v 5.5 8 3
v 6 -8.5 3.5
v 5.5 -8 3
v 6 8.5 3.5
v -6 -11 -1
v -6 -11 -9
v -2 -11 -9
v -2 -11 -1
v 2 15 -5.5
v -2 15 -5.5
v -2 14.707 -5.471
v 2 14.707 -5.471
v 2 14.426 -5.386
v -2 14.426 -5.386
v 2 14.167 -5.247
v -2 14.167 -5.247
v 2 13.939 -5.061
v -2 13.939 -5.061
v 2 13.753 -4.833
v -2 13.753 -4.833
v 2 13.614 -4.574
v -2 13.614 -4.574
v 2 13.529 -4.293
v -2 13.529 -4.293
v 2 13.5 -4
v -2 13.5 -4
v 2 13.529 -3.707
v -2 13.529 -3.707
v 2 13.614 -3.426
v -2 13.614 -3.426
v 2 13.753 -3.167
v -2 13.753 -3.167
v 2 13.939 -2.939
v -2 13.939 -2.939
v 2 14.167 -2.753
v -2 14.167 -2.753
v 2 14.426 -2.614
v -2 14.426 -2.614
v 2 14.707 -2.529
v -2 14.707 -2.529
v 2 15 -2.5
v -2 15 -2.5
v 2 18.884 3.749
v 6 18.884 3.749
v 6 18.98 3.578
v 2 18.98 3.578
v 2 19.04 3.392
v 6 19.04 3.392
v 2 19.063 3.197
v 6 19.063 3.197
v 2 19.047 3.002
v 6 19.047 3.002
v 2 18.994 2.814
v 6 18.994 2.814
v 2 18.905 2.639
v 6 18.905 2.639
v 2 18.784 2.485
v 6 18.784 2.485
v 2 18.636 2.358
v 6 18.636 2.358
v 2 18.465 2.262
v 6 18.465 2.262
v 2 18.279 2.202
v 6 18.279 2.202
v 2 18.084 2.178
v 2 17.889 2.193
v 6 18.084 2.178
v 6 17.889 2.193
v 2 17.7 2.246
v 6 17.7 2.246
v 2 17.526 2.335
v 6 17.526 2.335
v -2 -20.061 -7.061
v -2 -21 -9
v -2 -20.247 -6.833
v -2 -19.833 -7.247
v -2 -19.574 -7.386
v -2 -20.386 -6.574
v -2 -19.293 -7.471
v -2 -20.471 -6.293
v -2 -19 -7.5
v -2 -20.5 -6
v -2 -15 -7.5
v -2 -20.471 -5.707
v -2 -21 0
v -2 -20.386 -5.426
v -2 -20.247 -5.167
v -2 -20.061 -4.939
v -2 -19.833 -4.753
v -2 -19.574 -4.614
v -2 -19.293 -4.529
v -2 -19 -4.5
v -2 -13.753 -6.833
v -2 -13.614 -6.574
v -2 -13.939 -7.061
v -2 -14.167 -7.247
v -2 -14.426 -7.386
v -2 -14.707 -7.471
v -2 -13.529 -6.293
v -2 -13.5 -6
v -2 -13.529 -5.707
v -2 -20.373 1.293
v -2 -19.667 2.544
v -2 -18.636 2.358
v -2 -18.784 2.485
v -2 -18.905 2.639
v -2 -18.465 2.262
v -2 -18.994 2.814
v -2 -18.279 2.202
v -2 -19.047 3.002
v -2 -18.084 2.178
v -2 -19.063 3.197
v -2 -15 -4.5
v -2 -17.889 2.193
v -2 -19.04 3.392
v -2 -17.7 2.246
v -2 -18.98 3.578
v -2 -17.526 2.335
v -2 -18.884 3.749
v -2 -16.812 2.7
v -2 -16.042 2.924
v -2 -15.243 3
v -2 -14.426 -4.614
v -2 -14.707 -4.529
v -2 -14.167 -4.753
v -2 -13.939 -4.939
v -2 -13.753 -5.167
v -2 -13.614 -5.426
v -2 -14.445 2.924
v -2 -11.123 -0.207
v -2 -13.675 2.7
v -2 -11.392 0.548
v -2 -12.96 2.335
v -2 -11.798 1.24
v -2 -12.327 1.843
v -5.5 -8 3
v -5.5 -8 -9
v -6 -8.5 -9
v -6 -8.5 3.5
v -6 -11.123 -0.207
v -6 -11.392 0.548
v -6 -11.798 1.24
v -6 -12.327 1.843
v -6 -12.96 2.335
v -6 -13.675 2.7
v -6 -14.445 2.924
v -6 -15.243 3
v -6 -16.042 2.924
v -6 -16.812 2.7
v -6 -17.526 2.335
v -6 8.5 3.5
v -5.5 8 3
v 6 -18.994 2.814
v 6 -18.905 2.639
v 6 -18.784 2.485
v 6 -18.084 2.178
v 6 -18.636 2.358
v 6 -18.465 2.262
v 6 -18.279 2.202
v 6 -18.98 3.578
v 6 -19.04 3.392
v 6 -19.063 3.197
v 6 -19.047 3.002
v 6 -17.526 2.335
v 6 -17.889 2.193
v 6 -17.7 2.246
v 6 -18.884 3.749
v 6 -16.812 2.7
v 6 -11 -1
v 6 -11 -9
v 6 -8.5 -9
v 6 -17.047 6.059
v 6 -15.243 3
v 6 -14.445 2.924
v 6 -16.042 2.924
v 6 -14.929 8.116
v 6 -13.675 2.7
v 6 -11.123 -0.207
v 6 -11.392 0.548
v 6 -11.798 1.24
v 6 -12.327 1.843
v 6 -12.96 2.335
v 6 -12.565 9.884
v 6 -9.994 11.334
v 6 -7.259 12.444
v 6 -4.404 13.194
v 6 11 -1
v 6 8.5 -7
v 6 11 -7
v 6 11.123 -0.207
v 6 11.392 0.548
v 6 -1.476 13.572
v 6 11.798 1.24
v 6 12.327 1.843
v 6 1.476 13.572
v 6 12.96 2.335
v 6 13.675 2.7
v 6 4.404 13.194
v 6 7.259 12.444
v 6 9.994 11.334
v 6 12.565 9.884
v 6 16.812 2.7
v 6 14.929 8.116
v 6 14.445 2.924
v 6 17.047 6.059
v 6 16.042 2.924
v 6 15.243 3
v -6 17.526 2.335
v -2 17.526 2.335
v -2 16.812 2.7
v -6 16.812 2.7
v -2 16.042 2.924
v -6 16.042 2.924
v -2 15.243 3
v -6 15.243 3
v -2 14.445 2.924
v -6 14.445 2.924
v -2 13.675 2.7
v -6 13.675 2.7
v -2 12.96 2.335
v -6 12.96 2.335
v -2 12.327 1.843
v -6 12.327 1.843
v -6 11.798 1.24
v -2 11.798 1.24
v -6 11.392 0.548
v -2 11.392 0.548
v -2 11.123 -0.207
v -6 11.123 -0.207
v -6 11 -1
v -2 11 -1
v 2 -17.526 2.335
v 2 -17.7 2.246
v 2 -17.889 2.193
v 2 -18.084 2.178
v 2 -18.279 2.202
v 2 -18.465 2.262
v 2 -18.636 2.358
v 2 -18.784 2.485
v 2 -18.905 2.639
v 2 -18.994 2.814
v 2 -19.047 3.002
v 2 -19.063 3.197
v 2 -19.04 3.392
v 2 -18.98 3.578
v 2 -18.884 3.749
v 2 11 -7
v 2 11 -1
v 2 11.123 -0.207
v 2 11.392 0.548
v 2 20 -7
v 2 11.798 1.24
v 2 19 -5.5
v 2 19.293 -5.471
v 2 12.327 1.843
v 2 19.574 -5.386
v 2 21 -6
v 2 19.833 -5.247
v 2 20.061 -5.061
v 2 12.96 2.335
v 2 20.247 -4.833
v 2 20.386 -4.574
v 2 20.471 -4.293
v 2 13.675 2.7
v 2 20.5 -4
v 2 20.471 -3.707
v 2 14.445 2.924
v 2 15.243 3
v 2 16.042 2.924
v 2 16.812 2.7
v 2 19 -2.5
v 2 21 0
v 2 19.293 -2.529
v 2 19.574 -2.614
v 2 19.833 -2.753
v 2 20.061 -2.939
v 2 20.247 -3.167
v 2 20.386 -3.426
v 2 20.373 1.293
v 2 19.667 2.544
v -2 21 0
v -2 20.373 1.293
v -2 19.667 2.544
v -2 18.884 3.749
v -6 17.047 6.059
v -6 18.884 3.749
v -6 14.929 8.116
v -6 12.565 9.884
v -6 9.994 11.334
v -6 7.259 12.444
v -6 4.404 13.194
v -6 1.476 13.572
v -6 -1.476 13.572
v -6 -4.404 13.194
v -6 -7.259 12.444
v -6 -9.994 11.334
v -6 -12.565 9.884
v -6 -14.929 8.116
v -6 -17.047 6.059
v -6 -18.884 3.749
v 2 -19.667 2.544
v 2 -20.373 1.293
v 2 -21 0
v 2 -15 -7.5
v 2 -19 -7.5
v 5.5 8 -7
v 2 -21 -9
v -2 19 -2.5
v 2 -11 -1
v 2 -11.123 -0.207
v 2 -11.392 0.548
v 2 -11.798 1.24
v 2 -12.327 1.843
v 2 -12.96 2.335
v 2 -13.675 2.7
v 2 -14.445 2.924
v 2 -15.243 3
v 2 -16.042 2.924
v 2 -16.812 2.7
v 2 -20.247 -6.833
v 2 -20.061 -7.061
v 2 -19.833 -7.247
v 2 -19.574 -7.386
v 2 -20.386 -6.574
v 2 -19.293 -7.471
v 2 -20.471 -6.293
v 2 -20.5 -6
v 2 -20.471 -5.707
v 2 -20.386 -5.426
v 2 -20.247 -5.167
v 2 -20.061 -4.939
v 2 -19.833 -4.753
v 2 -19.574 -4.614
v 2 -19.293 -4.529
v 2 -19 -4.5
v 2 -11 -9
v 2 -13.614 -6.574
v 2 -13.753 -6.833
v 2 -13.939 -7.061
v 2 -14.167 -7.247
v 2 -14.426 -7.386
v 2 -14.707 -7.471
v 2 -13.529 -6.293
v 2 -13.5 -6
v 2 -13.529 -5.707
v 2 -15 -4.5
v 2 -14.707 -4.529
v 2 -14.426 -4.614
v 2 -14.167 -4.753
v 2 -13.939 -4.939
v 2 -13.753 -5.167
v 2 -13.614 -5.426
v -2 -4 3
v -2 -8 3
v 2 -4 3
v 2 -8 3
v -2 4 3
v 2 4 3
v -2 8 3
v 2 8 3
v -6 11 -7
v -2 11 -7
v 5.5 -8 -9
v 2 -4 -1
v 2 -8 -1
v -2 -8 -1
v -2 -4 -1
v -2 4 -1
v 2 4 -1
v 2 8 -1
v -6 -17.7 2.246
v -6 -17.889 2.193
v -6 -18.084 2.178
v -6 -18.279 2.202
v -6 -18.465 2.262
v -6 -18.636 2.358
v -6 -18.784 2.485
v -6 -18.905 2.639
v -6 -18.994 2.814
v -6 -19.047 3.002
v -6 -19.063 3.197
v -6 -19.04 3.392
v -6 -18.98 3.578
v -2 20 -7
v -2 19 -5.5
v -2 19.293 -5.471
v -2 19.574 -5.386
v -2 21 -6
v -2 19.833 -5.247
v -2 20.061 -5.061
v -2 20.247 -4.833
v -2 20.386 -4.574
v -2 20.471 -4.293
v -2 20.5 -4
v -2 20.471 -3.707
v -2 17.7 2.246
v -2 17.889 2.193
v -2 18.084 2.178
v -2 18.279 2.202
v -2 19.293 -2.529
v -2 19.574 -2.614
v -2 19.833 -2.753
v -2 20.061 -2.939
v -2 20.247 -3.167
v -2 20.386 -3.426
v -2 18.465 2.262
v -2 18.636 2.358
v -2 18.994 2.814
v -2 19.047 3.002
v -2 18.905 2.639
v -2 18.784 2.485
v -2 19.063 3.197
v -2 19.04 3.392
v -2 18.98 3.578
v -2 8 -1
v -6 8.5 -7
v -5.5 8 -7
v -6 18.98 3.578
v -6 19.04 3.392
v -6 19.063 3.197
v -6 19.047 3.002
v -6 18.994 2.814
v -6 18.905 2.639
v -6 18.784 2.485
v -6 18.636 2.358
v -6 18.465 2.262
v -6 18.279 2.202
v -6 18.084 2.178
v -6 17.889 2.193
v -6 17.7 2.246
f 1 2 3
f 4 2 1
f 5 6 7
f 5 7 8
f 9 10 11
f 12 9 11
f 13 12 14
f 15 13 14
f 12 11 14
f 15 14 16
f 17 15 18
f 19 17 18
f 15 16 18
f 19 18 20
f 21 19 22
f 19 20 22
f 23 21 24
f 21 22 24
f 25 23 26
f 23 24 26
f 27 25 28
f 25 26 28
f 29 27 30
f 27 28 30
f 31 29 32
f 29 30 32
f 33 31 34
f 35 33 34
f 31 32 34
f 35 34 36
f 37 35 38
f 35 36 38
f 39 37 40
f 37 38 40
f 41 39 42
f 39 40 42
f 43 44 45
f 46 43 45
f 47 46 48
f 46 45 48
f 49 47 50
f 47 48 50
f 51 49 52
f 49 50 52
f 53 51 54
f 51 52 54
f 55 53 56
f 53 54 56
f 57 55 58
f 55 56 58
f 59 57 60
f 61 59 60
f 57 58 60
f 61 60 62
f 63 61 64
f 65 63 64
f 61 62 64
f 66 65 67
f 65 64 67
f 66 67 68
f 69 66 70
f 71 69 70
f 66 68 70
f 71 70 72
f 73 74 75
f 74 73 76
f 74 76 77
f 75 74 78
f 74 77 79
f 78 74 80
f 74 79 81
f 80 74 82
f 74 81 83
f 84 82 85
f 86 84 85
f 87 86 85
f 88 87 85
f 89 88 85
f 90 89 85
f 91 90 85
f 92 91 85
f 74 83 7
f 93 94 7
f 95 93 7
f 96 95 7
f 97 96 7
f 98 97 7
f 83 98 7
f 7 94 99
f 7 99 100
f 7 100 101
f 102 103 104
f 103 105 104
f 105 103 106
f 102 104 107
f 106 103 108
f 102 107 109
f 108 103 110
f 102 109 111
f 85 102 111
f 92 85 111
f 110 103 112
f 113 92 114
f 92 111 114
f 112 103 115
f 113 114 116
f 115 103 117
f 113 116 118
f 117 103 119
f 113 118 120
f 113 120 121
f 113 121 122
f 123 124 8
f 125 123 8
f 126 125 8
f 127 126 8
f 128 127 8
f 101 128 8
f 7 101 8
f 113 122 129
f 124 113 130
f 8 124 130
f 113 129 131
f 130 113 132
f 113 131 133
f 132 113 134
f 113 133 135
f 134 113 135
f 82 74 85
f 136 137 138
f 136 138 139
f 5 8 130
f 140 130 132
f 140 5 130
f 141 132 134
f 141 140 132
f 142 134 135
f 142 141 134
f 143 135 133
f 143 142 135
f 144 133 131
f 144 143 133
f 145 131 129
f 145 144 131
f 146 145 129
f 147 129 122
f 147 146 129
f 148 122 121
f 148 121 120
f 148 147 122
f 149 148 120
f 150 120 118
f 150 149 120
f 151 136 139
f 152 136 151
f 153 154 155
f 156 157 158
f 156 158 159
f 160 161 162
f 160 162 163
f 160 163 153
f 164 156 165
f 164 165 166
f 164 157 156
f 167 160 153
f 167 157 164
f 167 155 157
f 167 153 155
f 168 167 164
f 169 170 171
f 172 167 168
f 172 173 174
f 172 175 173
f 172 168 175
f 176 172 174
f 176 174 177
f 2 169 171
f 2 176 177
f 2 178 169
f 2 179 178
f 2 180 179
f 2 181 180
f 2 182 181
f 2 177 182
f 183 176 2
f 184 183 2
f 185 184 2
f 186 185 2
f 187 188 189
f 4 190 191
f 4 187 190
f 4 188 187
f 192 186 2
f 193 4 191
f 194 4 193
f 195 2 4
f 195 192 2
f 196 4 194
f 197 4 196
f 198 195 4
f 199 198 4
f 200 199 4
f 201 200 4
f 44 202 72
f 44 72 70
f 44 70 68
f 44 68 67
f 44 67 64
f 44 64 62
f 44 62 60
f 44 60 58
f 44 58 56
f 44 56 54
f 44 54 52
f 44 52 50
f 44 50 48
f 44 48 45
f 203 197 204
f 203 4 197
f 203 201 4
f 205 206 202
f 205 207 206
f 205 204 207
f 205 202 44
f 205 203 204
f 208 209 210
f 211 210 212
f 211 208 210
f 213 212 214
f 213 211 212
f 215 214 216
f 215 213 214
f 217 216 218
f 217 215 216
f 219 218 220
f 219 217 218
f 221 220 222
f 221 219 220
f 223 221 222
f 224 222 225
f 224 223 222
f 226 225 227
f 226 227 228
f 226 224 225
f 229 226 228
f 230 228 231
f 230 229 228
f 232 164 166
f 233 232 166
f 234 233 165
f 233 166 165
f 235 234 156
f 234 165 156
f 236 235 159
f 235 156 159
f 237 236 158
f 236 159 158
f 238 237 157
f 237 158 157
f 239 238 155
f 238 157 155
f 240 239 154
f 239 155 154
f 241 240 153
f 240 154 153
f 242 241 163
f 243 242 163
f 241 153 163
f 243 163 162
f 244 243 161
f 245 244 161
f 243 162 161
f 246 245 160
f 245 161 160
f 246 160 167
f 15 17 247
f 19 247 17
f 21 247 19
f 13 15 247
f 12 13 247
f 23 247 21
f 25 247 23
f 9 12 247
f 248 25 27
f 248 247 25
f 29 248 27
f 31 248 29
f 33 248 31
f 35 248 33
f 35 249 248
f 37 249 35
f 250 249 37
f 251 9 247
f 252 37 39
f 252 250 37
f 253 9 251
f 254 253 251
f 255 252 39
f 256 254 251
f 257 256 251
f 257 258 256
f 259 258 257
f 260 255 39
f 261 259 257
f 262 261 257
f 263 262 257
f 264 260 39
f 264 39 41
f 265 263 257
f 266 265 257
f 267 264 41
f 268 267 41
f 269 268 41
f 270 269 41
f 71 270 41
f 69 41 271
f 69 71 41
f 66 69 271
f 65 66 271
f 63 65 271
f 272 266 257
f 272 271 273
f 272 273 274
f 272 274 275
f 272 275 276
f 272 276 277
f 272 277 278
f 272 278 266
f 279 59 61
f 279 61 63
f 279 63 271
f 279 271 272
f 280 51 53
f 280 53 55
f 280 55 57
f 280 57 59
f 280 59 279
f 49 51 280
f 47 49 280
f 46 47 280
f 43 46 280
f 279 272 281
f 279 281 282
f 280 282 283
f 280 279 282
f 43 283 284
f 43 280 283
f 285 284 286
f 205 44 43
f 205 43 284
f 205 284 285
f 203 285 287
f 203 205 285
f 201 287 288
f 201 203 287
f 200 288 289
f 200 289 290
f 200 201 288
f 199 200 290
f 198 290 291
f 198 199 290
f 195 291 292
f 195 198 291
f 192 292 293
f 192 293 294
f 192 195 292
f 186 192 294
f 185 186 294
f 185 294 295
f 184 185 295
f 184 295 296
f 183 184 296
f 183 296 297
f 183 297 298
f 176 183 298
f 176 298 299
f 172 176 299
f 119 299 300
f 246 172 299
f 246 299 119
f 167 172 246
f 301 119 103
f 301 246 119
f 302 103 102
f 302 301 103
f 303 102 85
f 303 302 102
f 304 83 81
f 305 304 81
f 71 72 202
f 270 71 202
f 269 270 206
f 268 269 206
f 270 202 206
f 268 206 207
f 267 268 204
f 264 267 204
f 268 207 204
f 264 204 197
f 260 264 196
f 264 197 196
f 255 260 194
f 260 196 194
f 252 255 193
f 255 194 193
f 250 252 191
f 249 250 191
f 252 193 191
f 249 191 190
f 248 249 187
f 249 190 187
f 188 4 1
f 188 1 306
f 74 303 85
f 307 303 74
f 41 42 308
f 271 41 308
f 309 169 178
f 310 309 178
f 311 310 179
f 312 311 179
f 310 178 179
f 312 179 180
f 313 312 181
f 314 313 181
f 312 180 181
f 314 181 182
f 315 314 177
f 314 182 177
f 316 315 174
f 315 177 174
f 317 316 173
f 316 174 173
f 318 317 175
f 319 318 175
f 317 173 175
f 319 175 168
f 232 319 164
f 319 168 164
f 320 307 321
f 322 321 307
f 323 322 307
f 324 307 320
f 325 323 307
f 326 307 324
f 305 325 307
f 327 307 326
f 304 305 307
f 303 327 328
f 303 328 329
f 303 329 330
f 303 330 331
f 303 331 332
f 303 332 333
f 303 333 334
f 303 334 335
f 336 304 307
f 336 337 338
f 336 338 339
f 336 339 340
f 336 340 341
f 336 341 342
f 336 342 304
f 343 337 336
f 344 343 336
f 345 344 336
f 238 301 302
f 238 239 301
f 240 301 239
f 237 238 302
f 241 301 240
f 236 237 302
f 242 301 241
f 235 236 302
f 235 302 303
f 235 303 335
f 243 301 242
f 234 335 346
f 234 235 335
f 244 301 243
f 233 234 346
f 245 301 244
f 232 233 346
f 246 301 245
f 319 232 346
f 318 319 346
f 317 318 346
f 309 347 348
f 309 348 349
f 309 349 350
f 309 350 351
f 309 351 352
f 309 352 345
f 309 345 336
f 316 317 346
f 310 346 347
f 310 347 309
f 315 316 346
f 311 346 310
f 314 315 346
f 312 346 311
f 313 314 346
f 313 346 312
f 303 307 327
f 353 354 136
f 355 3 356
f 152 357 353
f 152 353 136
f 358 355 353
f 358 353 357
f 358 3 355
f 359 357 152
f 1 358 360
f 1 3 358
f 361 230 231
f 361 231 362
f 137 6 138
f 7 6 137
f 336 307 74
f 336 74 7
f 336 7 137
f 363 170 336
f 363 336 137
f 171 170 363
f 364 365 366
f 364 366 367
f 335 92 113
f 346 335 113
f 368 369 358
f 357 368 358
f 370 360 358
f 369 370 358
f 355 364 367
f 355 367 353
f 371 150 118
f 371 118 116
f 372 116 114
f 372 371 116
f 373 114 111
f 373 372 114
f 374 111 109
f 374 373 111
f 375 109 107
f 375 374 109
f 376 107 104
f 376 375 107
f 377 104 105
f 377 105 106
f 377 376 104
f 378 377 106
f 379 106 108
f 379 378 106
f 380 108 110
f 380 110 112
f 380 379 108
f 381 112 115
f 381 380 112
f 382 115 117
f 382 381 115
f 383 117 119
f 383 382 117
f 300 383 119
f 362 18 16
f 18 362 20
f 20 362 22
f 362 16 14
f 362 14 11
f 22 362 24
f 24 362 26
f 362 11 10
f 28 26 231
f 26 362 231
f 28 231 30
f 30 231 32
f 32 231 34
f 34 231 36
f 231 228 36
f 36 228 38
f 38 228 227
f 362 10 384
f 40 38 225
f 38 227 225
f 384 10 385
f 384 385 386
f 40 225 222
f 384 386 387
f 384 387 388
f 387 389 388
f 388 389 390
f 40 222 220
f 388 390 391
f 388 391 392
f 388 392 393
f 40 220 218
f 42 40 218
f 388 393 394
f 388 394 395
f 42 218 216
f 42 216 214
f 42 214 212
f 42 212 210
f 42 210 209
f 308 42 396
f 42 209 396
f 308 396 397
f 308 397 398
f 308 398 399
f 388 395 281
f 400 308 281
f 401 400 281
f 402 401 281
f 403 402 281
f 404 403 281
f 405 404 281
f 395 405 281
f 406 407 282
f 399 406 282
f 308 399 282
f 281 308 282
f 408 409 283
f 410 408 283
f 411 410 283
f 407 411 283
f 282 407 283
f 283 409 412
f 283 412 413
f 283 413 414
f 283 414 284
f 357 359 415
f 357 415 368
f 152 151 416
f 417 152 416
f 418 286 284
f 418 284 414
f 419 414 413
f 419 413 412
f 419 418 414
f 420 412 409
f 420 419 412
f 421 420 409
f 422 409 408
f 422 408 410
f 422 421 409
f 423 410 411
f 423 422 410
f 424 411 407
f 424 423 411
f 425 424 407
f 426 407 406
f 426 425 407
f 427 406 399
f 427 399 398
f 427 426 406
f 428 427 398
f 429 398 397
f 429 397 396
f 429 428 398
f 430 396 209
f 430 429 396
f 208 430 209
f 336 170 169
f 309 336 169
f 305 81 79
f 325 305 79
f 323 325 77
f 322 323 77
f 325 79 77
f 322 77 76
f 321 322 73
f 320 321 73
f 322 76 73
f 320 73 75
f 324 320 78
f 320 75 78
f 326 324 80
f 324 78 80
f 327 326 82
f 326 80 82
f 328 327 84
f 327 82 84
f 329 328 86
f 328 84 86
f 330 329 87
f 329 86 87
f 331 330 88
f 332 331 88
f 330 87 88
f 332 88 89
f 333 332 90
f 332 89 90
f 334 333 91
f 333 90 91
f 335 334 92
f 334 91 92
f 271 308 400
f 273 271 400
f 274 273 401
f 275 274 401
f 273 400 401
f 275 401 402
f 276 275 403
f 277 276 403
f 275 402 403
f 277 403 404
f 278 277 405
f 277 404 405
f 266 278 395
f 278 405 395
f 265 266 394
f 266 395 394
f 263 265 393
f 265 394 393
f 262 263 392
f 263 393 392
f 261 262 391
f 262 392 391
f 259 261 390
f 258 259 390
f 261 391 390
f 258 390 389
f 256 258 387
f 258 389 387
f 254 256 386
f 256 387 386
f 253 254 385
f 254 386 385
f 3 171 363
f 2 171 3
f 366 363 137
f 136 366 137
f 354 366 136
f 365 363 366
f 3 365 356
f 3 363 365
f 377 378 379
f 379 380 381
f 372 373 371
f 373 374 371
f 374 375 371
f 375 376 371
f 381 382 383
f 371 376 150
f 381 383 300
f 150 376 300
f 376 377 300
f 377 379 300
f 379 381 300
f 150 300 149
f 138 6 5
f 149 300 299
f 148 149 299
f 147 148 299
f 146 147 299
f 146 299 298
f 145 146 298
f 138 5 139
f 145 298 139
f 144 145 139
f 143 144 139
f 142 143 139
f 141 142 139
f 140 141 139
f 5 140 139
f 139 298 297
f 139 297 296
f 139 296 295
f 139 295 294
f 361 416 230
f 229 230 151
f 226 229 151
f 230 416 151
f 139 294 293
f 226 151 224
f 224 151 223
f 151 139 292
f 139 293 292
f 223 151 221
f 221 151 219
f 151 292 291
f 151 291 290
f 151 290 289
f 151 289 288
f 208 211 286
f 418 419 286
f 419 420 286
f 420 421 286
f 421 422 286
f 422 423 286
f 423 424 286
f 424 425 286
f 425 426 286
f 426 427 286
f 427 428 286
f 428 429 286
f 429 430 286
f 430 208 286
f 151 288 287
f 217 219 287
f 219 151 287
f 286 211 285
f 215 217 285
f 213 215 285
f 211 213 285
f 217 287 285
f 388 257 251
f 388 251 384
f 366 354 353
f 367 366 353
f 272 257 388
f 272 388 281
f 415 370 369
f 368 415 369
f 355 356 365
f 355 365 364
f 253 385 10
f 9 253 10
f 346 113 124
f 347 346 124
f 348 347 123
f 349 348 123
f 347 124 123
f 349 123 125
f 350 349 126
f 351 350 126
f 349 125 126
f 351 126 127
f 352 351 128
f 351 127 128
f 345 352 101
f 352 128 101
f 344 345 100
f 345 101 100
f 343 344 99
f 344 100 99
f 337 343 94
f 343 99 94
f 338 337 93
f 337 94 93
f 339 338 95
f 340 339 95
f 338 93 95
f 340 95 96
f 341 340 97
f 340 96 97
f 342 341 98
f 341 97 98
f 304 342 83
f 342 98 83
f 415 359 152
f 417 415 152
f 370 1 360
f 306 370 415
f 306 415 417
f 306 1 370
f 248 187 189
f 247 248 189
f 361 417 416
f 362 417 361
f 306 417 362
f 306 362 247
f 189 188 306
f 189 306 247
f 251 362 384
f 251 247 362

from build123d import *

# Parameters (mm, degrees)
BOSS_EXTRUDE1_DEPTH     = 6
CHAMFER1_SIZE           = 0.5
CHAMFER2_SIZE           = 0.5
SKETCH3_W               = 4
SKETCH3_H               = 4
BOSS_EXTRUDE2_DEPTH     = 2
CUT_EXTRUDE1_START      = 28.757553028
CUT_EXTRUDE1_DEPTH      = 32.757553028
CHAMFER3_SIZE           = 1
CUT_EXTRUDE2_DEPTH      = 27.277019429
CUT_EXTRUDE2_DEPTH_BACK = 27.277019429
CUT_EXTRUDE3_DEPTH      = 27.277019429
CUT_EXTRUDE3_DEPTH_BACK = 27.277019429


with BuildPart() as part:
    # Sketch1 → Boss-Extrude1 (new, symmetric)
    with BuildSketch(Plane.YZ):
        with BuildLine():
            Line((-21, 0), (-21, -9))
            Line((-21, -9), (-8, -9))
            Line((-8, -9), (-8, 3))
            Line((-8, 3), (8, 3))
            Line((8, 3), (8, -7))
            Line((8, -7), (21, -7))
            Line((21, -7), (21, 0))
            ThreePointArc((21, 0), (0, 13.61916848), (-21, 0))
        make_face()
    extrude(amount=BOSS_EXTRUDE1_DEPTH, both=True)

    # Chamfer1
    chamfer1_edges = [part.edges().sort_by_distance(p)[0] for p in [
        (6, -8, -3),
        (6, 0, 3),
        (6, 8, -2),
    ]]
    chamfer(chamfer1_edges, length=CHAMFER1_SIZE)

    # Chamfer2
    chamfer2_edges = [part.edges().sort_by_distance(p)[0] for p in [
        (-6, -8, -3),
        (-6, 8, -2),
        (-6, 0, 3),
    ]]
    chamfer(chamfer2_edges, length=CHAMFER2_SIZE)

    # Sketch3 → Boss-Extrude2 (add, symmetric)
    with BuildSketch(Plane.YZ):
        with Locations((-6, 1)):
            Rectangle(SKETCH3_W, SKETCH3_H)
    boss_extrude2 = extrude(amount=BOSS_EXTRUDE2_DEPTH, both=True)

    # Mirror1: Boss-Extrude2 across plane
    add(boss_extrude2.mirror(Plane.ZX))

    # Sketch4 → Cut-Extrude1 (cut)
    with BuildSketch(Plane.YZ.offset(6).offset(CUT_EXTRUDE1_START)):
        with BuildLine():
            Line((-11, -9), (-11, -1))
            ThreePointArc((-11, -1), (-13.308790472, 2.534537402), (-17.525839358, 2.334620458))
            ThreePointArc((-17.525839358, 2.334620458), (-18.784311125, 2.485384213), (-18.884110874, 3.748919297))
            ThreePointArc((-18.884110874, 3.748919297), (-20.029956915, 1.924071221), (-21, 0))
            Line((-21, 0), (-21, -9))
            Line((-21, -9), (-11, -9))
        make_face()
        with BuildLine():
            Line((21, -7), (21, 0))
            ThreePointArc((21, 0), (20.029956915, 1.924071221), (18.884110874, 3.748919297))
            ThreePointArc((18.884110874, 3.748919297), (18.784311125, 2.485384213), (17.525839358, 2.334620458))
            ThreePointArc((17.525839358, 2.334620458), (13.308790472, 2.534537402), (11, -1))
            Line((11, -1), (11, -7))
            Line((11, -7), (21, -7))
        make_face()
    cut_extrude1 = extrude(amount=-CUT_EXTRUDE1_DEPTH, mode=Mode.SUBTRACT)

    # Mirror2: Cut-Extrude1 across plane
    add(cut_extrude1.mirror(Plane(origin=(0, 0, 0), x_dir=(0, 0, 1), z_dir=(1, 0, 0))), mode=Mode.SUBTRACT)

    # Chamfer3
    chamfer3_edges = [part.edges().sort_by_distance(p)[0] for p in [
        (0, 21, -7),
    ]]
    chamfer(chamfer3_edges, length=CHAMFER3_SIZE)

    # Sketch5 → Cut-Extrude2 (cut, two sides: drawn at the far end of the back side and taken through both)
    with BuildSketch(Plane.YZ.offset(2).offset(-CUT_EXTRUDE2_DEPTH_BACK)):
        with BuildLine():
            Line((-19, -4.5), (-15, -4.5))
            ThreePointArc((-15, -4.5), (-13.5, -6), (-15, -7.5))
            Line((-15, -7.5), (-19, -7.5))
            ThreePointArc((-19, -7.5), (-20.5, -6), (-19, -4.5))
        make_face()
    extrude(amount=CUT_EXTRUDE2_DEPTH + CUT_EXTRUDE2_DEPTH_BACK, mode=Mode.SUBTRACT)

    # Sketch6 → Cut-Extrude3 (cut, two sides: drawn at the far end of the back side and taken through both)
    with BuildSketch(Plane.YZ.offset(2).offset(-CUT_EXTRUDE3_DEPTH_BACK)):
        with BuildLine():
            Line((19, -5.5), (15, -5.5))
            ThreePointArc((15, -5.5), (13.5, -4), (15, -2.5))
            Line((15, -2.5), (19, -2.5))
            ThreePointArc((19, -2.5), (20.5, -4), (19, -5.5))
        make_face()
    extrude(amount=CUT_EXTRUDE3_DEPTH + CUT_EXTRUDE3_DEPTH_BACK, mode=Mode.SUBTRACT)


solid = part.part
